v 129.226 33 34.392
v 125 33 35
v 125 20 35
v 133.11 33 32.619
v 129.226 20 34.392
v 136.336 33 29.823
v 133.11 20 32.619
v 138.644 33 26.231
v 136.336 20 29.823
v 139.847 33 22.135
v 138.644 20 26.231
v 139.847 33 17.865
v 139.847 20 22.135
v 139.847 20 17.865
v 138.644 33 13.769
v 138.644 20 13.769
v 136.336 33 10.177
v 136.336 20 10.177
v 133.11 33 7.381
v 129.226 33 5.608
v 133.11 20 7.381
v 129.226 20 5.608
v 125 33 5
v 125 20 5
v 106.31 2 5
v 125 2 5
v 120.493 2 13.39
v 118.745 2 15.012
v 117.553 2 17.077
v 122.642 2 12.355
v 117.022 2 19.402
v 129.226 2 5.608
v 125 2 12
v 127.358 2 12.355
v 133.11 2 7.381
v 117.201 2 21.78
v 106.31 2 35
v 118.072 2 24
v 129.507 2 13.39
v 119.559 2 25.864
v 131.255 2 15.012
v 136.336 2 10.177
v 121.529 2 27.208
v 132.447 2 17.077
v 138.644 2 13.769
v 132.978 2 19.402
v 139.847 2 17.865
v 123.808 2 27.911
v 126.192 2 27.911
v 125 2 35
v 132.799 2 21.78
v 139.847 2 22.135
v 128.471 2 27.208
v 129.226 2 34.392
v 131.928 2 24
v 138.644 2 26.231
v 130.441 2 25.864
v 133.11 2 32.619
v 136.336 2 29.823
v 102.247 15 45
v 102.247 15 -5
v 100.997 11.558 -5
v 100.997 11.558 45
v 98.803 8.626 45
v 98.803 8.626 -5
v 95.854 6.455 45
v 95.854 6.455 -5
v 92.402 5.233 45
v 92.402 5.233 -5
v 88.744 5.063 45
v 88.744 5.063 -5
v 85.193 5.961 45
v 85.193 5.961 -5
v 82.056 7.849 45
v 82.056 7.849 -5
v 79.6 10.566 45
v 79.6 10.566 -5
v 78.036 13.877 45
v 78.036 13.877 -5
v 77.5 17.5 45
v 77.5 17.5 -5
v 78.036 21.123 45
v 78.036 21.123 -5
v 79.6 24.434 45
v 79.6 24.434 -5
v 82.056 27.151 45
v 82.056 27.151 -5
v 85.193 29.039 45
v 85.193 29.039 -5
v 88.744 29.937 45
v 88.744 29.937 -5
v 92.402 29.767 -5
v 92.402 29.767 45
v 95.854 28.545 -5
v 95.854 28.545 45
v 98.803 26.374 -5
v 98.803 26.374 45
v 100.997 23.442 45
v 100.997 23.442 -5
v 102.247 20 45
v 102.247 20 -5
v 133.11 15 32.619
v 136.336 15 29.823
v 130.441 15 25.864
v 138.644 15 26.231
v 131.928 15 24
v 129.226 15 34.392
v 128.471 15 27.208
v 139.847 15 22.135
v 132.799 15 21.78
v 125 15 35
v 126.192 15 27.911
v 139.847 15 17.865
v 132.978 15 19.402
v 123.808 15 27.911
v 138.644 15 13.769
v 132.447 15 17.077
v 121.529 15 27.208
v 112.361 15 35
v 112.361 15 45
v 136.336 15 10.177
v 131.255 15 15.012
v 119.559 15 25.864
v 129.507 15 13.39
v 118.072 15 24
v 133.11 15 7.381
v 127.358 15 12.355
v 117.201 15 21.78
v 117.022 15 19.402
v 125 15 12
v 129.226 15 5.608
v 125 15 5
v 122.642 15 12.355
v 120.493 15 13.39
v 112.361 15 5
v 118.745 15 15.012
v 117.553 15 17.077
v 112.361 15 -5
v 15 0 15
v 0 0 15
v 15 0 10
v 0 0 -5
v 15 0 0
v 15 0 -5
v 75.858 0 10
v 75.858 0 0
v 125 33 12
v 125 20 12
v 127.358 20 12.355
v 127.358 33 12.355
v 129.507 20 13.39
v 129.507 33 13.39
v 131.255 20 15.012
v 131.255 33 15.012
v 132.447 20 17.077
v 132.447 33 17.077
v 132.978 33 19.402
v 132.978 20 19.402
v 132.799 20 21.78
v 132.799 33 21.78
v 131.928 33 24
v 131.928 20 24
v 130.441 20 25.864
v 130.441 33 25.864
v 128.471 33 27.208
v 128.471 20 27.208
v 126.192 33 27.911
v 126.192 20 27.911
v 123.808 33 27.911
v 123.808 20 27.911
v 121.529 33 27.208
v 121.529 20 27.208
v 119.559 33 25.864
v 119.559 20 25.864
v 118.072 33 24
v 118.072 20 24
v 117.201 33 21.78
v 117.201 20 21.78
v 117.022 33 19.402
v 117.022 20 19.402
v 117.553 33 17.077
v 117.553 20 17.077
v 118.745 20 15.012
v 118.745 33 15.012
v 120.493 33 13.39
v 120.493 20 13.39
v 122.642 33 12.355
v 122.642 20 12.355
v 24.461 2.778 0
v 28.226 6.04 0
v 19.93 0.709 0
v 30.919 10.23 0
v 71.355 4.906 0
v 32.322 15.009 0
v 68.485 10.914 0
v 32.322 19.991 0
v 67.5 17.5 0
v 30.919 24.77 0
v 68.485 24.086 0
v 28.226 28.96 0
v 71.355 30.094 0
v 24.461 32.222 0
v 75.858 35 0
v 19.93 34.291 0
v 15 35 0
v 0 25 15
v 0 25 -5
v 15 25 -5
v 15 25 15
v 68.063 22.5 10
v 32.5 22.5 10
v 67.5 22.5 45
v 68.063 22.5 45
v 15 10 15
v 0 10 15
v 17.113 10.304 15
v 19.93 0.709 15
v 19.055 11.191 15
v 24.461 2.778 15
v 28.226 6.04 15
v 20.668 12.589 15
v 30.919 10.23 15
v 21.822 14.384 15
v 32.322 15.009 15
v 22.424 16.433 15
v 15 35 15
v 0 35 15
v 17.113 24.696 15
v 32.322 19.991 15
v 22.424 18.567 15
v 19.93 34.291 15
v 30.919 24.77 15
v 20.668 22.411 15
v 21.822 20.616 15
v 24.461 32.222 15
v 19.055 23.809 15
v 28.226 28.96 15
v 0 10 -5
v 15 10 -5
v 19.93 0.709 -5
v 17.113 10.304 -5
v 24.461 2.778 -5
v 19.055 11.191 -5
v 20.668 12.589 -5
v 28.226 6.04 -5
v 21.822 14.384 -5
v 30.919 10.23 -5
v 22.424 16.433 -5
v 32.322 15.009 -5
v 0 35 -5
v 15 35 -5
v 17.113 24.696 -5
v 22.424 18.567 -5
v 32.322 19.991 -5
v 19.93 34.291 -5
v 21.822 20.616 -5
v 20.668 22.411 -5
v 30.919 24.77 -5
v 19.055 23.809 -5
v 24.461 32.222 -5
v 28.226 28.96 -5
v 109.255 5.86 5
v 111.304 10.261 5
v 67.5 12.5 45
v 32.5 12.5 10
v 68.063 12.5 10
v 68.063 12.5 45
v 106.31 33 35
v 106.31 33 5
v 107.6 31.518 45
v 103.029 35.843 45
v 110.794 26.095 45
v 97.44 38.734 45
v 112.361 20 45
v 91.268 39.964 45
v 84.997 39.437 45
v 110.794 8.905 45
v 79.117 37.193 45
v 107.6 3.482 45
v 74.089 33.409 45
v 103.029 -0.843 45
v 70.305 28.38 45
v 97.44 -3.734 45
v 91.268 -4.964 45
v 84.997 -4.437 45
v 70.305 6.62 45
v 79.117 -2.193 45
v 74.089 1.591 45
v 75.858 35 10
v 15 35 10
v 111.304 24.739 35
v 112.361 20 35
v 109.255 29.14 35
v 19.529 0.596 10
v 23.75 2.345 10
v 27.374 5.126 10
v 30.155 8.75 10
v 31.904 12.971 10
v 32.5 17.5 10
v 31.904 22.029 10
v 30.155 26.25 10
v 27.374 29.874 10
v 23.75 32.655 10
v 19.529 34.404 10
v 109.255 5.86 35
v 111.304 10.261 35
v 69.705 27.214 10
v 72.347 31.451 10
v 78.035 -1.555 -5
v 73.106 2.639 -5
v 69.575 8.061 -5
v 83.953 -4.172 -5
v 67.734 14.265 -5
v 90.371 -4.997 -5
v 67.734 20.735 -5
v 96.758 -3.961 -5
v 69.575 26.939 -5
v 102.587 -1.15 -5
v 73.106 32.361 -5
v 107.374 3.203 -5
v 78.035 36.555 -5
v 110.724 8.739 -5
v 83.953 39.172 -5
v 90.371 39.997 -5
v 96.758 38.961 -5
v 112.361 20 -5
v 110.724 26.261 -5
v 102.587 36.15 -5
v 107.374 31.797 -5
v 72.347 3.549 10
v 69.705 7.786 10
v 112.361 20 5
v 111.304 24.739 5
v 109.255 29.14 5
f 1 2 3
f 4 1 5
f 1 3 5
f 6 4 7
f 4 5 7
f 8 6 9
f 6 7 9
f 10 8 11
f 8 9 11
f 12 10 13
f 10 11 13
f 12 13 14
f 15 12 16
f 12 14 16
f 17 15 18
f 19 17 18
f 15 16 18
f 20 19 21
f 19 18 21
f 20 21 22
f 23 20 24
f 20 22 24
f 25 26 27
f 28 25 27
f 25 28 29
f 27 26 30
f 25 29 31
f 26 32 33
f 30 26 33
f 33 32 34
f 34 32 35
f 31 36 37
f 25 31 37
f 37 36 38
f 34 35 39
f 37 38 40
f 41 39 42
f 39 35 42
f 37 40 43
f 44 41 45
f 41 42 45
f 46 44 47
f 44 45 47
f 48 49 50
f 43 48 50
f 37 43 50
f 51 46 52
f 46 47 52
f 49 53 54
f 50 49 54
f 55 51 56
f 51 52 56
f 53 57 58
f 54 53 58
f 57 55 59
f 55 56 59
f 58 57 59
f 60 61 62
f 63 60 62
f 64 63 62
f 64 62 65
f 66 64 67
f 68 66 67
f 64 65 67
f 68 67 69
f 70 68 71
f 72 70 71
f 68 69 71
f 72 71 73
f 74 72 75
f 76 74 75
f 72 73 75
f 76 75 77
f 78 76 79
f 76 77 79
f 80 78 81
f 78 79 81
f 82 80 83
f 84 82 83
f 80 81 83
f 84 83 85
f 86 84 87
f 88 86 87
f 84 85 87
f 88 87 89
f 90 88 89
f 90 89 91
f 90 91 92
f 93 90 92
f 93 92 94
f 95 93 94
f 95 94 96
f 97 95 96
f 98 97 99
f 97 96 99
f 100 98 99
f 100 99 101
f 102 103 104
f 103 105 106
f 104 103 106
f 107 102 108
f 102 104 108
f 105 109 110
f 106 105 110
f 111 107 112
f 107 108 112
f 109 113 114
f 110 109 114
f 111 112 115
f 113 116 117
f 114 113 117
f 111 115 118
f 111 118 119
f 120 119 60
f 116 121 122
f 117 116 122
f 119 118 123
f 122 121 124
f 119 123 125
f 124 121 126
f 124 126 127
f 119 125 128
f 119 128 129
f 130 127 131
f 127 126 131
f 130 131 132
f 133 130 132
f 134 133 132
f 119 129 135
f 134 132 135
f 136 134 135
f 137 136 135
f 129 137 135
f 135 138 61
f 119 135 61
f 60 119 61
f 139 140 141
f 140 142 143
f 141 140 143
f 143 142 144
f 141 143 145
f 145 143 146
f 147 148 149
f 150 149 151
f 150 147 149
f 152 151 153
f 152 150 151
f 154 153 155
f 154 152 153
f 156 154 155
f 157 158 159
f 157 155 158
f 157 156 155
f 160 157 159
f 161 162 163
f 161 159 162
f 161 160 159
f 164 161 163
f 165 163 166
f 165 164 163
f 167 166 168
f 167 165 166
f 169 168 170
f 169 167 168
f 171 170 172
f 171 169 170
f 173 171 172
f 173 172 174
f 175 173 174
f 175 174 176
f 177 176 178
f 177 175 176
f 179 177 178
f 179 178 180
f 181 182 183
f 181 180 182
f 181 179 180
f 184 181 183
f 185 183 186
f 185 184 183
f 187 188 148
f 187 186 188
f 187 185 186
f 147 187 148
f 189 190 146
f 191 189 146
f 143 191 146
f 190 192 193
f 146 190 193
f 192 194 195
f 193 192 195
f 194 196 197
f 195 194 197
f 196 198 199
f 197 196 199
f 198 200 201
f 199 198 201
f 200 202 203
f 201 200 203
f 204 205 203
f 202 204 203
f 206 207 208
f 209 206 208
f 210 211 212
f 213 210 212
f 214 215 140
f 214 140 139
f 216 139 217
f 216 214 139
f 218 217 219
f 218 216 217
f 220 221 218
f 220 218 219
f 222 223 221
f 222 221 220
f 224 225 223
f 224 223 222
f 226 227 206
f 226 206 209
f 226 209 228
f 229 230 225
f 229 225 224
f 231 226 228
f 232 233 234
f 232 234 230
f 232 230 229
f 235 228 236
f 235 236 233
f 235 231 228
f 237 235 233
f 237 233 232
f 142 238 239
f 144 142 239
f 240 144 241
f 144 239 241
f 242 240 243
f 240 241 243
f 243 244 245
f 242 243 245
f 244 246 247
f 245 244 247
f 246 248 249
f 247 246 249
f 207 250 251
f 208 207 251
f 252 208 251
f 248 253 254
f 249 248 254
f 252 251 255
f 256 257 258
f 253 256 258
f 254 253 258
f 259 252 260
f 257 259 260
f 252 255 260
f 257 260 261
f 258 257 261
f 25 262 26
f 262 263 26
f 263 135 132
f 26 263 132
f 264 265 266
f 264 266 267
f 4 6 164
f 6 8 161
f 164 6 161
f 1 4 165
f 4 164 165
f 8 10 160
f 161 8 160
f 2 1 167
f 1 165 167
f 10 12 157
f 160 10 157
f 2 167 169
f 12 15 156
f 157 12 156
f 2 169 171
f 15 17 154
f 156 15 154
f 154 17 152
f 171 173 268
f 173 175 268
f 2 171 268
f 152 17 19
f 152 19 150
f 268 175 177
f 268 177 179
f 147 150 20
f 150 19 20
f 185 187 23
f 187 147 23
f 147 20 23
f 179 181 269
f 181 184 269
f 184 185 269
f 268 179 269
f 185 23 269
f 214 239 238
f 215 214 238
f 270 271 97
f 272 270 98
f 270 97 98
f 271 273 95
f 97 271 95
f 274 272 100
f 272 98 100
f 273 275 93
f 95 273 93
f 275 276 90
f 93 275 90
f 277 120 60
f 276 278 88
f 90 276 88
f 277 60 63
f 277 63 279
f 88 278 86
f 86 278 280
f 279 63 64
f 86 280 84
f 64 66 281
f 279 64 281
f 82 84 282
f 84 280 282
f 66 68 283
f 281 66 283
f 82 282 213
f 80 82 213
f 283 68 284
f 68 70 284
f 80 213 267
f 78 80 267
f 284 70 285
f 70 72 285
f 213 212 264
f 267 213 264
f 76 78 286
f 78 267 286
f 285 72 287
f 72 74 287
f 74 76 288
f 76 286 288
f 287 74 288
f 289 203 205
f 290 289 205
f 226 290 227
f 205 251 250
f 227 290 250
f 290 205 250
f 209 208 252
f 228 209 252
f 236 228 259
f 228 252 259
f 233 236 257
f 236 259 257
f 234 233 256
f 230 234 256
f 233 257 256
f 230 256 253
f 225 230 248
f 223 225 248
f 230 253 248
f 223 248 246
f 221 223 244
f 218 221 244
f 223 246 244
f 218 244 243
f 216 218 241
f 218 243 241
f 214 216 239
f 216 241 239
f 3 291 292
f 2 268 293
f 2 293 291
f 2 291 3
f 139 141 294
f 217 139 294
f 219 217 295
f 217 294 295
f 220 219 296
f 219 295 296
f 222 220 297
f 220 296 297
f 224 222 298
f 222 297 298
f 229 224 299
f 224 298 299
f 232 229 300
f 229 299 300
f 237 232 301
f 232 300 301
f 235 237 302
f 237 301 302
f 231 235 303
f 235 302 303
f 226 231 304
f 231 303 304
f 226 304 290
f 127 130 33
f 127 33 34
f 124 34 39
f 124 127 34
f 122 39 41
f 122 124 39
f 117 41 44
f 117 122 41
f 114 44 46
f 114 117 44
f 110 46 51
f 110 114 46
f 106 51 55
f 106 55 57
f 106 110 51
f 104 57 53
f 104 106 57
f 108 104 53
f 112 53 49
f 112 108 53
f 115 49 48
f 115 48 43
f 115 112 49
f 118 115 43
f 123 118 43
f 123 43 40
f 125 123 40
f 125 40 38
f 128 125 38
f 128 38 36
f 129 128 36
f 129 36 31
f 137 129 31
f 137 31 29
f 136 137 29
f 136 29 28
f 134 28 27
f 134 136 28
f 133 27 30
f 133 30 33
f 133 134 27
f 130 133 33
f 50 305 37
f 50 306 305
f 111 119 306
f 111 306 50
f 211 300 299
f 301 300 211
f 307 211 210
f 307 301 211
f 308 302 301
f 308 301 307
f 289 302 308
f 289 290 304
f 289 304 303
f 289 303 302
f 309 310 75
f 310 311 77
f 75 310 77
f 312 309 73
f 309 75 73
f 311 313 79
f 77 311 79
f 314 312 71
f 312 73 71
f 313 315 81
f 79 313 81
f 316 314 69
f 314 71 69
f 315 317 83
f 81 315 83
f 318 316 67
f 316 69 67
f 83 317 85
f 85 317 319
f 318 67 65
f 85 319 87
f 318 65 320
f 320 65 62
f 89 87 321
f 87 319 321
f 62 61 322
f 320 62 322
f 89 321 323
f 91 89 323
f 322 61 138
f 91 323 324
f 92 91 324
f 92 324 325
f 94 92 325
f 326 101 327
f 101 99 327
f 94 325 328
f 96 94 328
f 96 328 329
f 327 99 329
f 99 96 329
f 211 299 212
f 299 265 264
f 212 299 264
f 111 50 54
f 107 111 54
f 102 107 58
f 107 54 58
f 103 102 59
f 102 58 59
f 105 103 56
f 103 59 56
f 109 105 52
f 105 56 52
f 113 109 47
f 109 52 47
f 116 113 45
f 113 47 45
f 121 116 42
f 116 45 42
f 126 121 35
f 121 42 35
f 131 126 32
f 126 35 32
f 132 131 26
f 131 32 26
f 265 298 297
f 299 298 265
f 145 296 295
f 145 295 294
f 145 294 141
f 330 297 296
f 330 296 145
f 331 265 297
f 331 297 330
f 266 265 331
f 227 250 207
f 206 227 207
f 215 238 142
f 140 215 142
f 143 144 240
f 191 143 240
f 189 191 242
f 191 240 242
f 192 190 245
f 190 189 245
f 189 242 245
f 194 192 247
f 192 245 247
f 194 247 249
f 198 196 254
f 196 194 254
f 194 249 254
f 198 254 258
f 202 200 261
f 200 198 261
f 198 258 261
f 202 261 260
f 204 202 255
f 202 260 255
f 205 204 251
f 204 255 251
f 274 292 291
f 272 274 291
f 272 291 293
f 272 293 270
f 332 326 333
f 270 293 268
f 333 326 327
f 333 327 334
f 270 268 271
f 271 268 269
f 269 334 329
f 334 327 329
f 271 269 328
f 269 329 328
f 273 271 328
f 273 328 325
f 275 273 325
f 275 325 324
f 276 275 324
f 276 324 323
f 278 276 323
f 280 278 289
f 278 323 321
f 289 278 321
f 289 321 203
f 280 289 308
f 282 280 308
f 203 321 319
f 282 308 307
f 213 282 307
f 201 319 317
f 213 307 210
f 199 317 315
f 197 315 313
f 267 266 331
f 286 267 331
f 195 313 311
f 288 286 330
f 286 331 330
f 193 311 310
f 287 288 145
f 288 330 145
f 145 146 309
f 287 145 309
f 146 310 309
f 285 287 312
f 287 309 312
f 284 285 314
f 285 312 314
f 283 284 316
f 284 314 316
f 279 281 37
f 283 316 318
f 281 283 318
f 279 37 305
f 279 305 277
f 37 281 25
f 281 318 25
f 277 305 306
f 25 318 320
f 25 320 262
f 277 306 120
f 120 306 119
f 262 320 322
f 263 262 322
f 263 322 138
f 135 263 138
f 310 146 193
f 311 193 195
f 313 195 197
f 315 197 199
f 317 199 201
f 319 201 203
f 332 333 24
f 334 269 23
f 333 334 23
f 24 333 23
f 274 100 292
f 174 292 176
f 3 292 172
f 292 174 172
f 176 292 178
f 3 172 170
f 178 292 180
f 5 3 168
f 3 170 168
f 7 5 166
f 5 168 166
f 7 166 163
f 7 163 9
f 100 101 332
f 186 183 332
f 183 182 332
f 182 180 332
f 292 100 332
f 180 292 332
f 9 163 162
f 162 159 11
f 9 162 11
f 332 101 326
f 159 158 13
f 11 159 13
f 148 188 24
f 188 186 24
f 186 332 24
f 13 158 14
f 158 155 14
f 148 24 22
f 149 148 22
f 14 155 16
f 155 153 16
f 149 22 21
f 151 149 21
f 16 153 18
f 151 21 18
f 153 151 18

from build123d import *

# Parameters (mm, degrees)
BOSS_EXTRUDE1_DEPTH       = 10
BOSS_EXTRUDE2_DEPTH       = 5
BOSS_EXTRUDE2_DEPTH_BACK  = 15
BOSS_EXTRUDE3_DEPTH       = 35
BOSS_EXTRUDE3_DEPTH_BACK  = 15
RIB27_REACH               = 125.11
SKETCH19_WALL_W           = 287.352003994
SKETCH19_WALL_H           = 10
BOSS_EXTRUDE4_DEPTH       = 5
RIB29_REACH               = 127.025
SKETCH20_WALL_W           = 301.546848684
SKETCH20_WALL_H           = 10
CUT_EXTRUDE1_START        = -5
CUT_EXTRUDE1_DEPTH        = 5
CUT_EXTRUDE2_DEPTH        = 5
SKETCH37_R                = 8
BOSS_EXTRUDE6_DEPTH       = 15.5
BOSS_EXTRUDE11_REACH      = 129.598
BOSS_EXTRUDE11_END_RADIUS = 22.5
SKETCH45_W                = 30
SKETCH45_H                = 15.5
BOSS_EXTRUDE12_REACH      = 129.598
BOSS_EXTRUDE12_END_RADIUS = 22.5
SKETCH48_W                = 30
SKETCH48_H                = 15.5
SKETCH52_W                = 33.733601919
SKETCH52_H                = 5
CUT_EXTRUDE4_DEPTH        = 154.948043183


with BuildPart() as part:
    # Sketch1 → Boss-Extrude1 (new body)
    with BuildSketch(Plane.XY):
        with BuildLine():
            Line((15, 0), (75.857864376, 0))
            ThreePointArc((75.857864376, 0), (67.5, 17.5), (75.857864376, 35))
            Line((75.857864376, 35), (15, 35))
            ThreePointArc((15, 35), (32.5, 17.5), (15, 0))
        make_face()
    extrude(amount=BOSS_EXTRUDE1_DEPTH)

    # Sketch2 → Boss-Extrude2 (add, two sides: drawn at the far end of the back side and taken through both)
    with BuildSketch(Plane.XY.offset(10).offset(-BOSS_EXTRUDE2_DEPTH_BACK)):
        with BuildLine():
            Line((15, 10), (0, 10))
            Line((0, 10), (0, 0))
            Line((0, 0), (15, 0))
            ThreePointArc((15, 0), (32.5, 17.5), (15, 35))
            Line((15, 35), (0, 35))
            Line((0, 35), (0, 25))
            Line((0, 25), (15, 25))
            ThreePointArc((15, 25), (22.5, 17.5), (15, 10))
        make_face()
    extrude(amount=BOSS_EXTRUDE2_DEPTH + BOSS_EXTRUDE2_DEPTH_BACK)

    # Sketch3 → Boss-Extrude3 (add, two sides: drawn at the far end of the back side and taken through both)
    with BuildSketch(Plane.XY.offset(10).offset(-BOSS_EXTRUDE3_DEPTH_BACK)):
        with BuildLine():
            Line((102.247448714, 20), (112.360679775, 20))
            ThreePointArc((112.360679775, 20), (67.5, 17.5), (112.360679775, 15))
            Line((112.360679775, 15), (102.247448714, 15))
            ThreePointArc((102.247448714, 15), (77.5, 17.5), (102.247448714, 20))
        make_face()
    extrude(amount=BOSS_EXTRUDE3_DEPTH + BOSS_EXTRUDE3_DEPTH_BACK)

    # Sketch19 wall → Rib27 (add, up to next)
    with BuildSketch(Plane(origin=(50, 17.5, 18.75), x_dir=(0.894427191, 0, 0.4472135955), z_dir=(0.4472135955, 0, -0.894427191)), mode=Mode.PRIVATE) as rib27_sk1:
        Rectangle(SKETCH19_WALL_W, SKETCH19_WALL_H)
    rib27_tool1 = extrude(rib27_sk1.sketch, amount=RIB27_REACH, mode=Mode.PRIVATE) - part.part
    add(rib27_tool1.solids().sort_by_distance((50, 17.5, 18.75))[0])

    # Sketch21 → Boss-Extrude4 (add)
    with BuildSketch(Plane.XY.offset(45)):
        with BuildLine():
            Line((102.247448714, 20), (112.360679775, 20))
            ThreePointArc((112.360679775, 20), (67.5, 17.5), (112.360679775, 15))
            Line((112.360679775, 15), (102.247448714, 15))
            ThreePointArc((102.247448714, 15), (77.5, 17.5), (102.247448714, 20))
        make_face()
    extrude(amount=BOSS_EXTRUDE4_DEPTH)

    # Sketch20 wall → Rib29 (add, up to next)
    with BuildSketch(Plane(origin=(50, 17.5, 27.5), x_dir=(0.707106781187, 0, 0.707106781187), z_dir=(0.707106781187, 0, -0.707106781187)), mode=Mode.PRIVATE) as rib29_sk1:
        Rectangle(SKETCH20_WALL_W, SKETCH20_WALL_H)
    rib29_tool1 = extrude(rib29_sk1.sketch, amount=RIB29_REACH, mode=Mode.PRIVATE) - part.part
    add(rib29_tool1.solids().sort_by_distance((50, 17.5, 27.5))[0])

    # Sketch23 → Cut-Extrude1 (cut)
    with BuildSketch(Plane.XY.offset(50).offset(CUT_EXTRUDE1_START)):
        with BuildLine():
            Line((102.247448714, 20), (112.360679775, 20))
            ThreePointArc((112.360679775, 20), (67.5, 17.5), (112.360679775, 15))
            Line((112.360679775, 15), (102.247448714, 15))
            ThreePointArc((102.247448714, 15), (77.5, 17.5), (102.247448714, 20))
        make_face()
    extrude(amount=CUT_EXTRUDE1_DEPTH, mode=Mode.SUBTRACT)

    # Sketch25 → Cut-Extrude2 (cut)
    with BuildSketch(Plane.ZY.offset(-67.5)):
        Polygon((45, 17.5), (45, 9.449706044), (52.526454381, 9.449706044), (52.526454381, 28.660137354), (45, 28.660137354), align=None)
    extrude(amount=-CUT_EXTRUDE2_DEPTH, mode=Mode.SUBTRACT)



with BuildPart() as body_2:
    # Sketch37 → Boss-Extrude6 (new, symmetric)
    with BuildSketch(Plane(origin=(0, 17.5, 0), x_dir=(-1, 0, 0), z_dir=(0, -1, 0))):
        with BuildLine():
            Line((-125, -5), (-112.5, -5))
            Line((-112.5, -5), (-112.5, -35))
            Line((-112.5, -35), (-125, -35))
            ThreePointArc((-125, -35), (-140, -20), (-125, -5))
        make_face()
        with Locations((-125, -20)):
            Circle(SKETCH37_R, mode=Mode.SUBTRACT)
    extrude(amount=BOSS_EXTRUDE6_DEPTH, both=True)


with BuildPart() as part_1:
    add(part.part)

    add(body_2.part)  # Boss-Extrude11 merges body 2
    # Boss-Extrude11: up to this cylinder (the profile starts outside it)
    boss_extrude11_end = Plane(origin=(90, 17.5, 20), z_dir=(0, 0, 1)) * Cylinder(BOSS_EXTRUDE11_END_RADIUS, 305.196, mode=Mode.PRIVATE)
    # Sketch45 → Boss-Extrude11 (add, up to the surface)
    with BuildSketch(Plane.ZY.offset(-112.5), mode=Mode.PRIVATE) as boss_extrude11_sk1:
        with Locations((20, 9.75)):
            Rectangle(SKETCH45_W, SKETCH45_H)
    boss_extrude11_tool1 = extrude(boss_extrude11_sk1.sketch, amount=BOSS_EXTRUDE11_REACH, mode=Mode.PRIVATE) - boss_extrude11_end
    add(boss_extrude11_tool1.solids().sort_by_distance((112.5, 9.75, 20))[0])

    # Boss-Extrude12: up to this cylinder (the profile starts outside it)
    boss_extrude12_end = Plane(origin=(90, 17.5, 20), z_dir=(0, 0, 1)) * Cylinder(BOSS_EXTRUDE12_END_RADIUS, 305.196, mode=Mode.PRIVATE)
    # Sketch48 → Boss-Extrude12 (add, up to the surface)
    with BuildSketch(Plane.ZY.offset(-112.5), mode=Mode.PRIVATE) as boss_extrude12_sk1:
        with Locations((20, 25.25)):
            Rectangle(SKETCH48_W, SKETCH48_H)
    boss_extrude12_tool1 = extrude(boss_extrude12_sk1.sketch, amount=BOSS_EXTRUDE12_REACH, mode=Mode.PRIVATE) - boss_extrude12_end
    add(boss_extrude12_tool1.solids().sort_by_distance((112.5, 25.25, 20))[0])

    # Sketch52 → Cut-Extrude4 (cut, through all)
    with BuildSketch(Plane.XY.offset(45)):
        with Locations((129.227480735, 17.5)):
            Rectangle(SKETCH52_W, SKETCH52_H)
    extrude(amount=-CUT_EXTRUDE4_DEPTH, mode=Mode.SUBTRACT)


solid = part_1.part
